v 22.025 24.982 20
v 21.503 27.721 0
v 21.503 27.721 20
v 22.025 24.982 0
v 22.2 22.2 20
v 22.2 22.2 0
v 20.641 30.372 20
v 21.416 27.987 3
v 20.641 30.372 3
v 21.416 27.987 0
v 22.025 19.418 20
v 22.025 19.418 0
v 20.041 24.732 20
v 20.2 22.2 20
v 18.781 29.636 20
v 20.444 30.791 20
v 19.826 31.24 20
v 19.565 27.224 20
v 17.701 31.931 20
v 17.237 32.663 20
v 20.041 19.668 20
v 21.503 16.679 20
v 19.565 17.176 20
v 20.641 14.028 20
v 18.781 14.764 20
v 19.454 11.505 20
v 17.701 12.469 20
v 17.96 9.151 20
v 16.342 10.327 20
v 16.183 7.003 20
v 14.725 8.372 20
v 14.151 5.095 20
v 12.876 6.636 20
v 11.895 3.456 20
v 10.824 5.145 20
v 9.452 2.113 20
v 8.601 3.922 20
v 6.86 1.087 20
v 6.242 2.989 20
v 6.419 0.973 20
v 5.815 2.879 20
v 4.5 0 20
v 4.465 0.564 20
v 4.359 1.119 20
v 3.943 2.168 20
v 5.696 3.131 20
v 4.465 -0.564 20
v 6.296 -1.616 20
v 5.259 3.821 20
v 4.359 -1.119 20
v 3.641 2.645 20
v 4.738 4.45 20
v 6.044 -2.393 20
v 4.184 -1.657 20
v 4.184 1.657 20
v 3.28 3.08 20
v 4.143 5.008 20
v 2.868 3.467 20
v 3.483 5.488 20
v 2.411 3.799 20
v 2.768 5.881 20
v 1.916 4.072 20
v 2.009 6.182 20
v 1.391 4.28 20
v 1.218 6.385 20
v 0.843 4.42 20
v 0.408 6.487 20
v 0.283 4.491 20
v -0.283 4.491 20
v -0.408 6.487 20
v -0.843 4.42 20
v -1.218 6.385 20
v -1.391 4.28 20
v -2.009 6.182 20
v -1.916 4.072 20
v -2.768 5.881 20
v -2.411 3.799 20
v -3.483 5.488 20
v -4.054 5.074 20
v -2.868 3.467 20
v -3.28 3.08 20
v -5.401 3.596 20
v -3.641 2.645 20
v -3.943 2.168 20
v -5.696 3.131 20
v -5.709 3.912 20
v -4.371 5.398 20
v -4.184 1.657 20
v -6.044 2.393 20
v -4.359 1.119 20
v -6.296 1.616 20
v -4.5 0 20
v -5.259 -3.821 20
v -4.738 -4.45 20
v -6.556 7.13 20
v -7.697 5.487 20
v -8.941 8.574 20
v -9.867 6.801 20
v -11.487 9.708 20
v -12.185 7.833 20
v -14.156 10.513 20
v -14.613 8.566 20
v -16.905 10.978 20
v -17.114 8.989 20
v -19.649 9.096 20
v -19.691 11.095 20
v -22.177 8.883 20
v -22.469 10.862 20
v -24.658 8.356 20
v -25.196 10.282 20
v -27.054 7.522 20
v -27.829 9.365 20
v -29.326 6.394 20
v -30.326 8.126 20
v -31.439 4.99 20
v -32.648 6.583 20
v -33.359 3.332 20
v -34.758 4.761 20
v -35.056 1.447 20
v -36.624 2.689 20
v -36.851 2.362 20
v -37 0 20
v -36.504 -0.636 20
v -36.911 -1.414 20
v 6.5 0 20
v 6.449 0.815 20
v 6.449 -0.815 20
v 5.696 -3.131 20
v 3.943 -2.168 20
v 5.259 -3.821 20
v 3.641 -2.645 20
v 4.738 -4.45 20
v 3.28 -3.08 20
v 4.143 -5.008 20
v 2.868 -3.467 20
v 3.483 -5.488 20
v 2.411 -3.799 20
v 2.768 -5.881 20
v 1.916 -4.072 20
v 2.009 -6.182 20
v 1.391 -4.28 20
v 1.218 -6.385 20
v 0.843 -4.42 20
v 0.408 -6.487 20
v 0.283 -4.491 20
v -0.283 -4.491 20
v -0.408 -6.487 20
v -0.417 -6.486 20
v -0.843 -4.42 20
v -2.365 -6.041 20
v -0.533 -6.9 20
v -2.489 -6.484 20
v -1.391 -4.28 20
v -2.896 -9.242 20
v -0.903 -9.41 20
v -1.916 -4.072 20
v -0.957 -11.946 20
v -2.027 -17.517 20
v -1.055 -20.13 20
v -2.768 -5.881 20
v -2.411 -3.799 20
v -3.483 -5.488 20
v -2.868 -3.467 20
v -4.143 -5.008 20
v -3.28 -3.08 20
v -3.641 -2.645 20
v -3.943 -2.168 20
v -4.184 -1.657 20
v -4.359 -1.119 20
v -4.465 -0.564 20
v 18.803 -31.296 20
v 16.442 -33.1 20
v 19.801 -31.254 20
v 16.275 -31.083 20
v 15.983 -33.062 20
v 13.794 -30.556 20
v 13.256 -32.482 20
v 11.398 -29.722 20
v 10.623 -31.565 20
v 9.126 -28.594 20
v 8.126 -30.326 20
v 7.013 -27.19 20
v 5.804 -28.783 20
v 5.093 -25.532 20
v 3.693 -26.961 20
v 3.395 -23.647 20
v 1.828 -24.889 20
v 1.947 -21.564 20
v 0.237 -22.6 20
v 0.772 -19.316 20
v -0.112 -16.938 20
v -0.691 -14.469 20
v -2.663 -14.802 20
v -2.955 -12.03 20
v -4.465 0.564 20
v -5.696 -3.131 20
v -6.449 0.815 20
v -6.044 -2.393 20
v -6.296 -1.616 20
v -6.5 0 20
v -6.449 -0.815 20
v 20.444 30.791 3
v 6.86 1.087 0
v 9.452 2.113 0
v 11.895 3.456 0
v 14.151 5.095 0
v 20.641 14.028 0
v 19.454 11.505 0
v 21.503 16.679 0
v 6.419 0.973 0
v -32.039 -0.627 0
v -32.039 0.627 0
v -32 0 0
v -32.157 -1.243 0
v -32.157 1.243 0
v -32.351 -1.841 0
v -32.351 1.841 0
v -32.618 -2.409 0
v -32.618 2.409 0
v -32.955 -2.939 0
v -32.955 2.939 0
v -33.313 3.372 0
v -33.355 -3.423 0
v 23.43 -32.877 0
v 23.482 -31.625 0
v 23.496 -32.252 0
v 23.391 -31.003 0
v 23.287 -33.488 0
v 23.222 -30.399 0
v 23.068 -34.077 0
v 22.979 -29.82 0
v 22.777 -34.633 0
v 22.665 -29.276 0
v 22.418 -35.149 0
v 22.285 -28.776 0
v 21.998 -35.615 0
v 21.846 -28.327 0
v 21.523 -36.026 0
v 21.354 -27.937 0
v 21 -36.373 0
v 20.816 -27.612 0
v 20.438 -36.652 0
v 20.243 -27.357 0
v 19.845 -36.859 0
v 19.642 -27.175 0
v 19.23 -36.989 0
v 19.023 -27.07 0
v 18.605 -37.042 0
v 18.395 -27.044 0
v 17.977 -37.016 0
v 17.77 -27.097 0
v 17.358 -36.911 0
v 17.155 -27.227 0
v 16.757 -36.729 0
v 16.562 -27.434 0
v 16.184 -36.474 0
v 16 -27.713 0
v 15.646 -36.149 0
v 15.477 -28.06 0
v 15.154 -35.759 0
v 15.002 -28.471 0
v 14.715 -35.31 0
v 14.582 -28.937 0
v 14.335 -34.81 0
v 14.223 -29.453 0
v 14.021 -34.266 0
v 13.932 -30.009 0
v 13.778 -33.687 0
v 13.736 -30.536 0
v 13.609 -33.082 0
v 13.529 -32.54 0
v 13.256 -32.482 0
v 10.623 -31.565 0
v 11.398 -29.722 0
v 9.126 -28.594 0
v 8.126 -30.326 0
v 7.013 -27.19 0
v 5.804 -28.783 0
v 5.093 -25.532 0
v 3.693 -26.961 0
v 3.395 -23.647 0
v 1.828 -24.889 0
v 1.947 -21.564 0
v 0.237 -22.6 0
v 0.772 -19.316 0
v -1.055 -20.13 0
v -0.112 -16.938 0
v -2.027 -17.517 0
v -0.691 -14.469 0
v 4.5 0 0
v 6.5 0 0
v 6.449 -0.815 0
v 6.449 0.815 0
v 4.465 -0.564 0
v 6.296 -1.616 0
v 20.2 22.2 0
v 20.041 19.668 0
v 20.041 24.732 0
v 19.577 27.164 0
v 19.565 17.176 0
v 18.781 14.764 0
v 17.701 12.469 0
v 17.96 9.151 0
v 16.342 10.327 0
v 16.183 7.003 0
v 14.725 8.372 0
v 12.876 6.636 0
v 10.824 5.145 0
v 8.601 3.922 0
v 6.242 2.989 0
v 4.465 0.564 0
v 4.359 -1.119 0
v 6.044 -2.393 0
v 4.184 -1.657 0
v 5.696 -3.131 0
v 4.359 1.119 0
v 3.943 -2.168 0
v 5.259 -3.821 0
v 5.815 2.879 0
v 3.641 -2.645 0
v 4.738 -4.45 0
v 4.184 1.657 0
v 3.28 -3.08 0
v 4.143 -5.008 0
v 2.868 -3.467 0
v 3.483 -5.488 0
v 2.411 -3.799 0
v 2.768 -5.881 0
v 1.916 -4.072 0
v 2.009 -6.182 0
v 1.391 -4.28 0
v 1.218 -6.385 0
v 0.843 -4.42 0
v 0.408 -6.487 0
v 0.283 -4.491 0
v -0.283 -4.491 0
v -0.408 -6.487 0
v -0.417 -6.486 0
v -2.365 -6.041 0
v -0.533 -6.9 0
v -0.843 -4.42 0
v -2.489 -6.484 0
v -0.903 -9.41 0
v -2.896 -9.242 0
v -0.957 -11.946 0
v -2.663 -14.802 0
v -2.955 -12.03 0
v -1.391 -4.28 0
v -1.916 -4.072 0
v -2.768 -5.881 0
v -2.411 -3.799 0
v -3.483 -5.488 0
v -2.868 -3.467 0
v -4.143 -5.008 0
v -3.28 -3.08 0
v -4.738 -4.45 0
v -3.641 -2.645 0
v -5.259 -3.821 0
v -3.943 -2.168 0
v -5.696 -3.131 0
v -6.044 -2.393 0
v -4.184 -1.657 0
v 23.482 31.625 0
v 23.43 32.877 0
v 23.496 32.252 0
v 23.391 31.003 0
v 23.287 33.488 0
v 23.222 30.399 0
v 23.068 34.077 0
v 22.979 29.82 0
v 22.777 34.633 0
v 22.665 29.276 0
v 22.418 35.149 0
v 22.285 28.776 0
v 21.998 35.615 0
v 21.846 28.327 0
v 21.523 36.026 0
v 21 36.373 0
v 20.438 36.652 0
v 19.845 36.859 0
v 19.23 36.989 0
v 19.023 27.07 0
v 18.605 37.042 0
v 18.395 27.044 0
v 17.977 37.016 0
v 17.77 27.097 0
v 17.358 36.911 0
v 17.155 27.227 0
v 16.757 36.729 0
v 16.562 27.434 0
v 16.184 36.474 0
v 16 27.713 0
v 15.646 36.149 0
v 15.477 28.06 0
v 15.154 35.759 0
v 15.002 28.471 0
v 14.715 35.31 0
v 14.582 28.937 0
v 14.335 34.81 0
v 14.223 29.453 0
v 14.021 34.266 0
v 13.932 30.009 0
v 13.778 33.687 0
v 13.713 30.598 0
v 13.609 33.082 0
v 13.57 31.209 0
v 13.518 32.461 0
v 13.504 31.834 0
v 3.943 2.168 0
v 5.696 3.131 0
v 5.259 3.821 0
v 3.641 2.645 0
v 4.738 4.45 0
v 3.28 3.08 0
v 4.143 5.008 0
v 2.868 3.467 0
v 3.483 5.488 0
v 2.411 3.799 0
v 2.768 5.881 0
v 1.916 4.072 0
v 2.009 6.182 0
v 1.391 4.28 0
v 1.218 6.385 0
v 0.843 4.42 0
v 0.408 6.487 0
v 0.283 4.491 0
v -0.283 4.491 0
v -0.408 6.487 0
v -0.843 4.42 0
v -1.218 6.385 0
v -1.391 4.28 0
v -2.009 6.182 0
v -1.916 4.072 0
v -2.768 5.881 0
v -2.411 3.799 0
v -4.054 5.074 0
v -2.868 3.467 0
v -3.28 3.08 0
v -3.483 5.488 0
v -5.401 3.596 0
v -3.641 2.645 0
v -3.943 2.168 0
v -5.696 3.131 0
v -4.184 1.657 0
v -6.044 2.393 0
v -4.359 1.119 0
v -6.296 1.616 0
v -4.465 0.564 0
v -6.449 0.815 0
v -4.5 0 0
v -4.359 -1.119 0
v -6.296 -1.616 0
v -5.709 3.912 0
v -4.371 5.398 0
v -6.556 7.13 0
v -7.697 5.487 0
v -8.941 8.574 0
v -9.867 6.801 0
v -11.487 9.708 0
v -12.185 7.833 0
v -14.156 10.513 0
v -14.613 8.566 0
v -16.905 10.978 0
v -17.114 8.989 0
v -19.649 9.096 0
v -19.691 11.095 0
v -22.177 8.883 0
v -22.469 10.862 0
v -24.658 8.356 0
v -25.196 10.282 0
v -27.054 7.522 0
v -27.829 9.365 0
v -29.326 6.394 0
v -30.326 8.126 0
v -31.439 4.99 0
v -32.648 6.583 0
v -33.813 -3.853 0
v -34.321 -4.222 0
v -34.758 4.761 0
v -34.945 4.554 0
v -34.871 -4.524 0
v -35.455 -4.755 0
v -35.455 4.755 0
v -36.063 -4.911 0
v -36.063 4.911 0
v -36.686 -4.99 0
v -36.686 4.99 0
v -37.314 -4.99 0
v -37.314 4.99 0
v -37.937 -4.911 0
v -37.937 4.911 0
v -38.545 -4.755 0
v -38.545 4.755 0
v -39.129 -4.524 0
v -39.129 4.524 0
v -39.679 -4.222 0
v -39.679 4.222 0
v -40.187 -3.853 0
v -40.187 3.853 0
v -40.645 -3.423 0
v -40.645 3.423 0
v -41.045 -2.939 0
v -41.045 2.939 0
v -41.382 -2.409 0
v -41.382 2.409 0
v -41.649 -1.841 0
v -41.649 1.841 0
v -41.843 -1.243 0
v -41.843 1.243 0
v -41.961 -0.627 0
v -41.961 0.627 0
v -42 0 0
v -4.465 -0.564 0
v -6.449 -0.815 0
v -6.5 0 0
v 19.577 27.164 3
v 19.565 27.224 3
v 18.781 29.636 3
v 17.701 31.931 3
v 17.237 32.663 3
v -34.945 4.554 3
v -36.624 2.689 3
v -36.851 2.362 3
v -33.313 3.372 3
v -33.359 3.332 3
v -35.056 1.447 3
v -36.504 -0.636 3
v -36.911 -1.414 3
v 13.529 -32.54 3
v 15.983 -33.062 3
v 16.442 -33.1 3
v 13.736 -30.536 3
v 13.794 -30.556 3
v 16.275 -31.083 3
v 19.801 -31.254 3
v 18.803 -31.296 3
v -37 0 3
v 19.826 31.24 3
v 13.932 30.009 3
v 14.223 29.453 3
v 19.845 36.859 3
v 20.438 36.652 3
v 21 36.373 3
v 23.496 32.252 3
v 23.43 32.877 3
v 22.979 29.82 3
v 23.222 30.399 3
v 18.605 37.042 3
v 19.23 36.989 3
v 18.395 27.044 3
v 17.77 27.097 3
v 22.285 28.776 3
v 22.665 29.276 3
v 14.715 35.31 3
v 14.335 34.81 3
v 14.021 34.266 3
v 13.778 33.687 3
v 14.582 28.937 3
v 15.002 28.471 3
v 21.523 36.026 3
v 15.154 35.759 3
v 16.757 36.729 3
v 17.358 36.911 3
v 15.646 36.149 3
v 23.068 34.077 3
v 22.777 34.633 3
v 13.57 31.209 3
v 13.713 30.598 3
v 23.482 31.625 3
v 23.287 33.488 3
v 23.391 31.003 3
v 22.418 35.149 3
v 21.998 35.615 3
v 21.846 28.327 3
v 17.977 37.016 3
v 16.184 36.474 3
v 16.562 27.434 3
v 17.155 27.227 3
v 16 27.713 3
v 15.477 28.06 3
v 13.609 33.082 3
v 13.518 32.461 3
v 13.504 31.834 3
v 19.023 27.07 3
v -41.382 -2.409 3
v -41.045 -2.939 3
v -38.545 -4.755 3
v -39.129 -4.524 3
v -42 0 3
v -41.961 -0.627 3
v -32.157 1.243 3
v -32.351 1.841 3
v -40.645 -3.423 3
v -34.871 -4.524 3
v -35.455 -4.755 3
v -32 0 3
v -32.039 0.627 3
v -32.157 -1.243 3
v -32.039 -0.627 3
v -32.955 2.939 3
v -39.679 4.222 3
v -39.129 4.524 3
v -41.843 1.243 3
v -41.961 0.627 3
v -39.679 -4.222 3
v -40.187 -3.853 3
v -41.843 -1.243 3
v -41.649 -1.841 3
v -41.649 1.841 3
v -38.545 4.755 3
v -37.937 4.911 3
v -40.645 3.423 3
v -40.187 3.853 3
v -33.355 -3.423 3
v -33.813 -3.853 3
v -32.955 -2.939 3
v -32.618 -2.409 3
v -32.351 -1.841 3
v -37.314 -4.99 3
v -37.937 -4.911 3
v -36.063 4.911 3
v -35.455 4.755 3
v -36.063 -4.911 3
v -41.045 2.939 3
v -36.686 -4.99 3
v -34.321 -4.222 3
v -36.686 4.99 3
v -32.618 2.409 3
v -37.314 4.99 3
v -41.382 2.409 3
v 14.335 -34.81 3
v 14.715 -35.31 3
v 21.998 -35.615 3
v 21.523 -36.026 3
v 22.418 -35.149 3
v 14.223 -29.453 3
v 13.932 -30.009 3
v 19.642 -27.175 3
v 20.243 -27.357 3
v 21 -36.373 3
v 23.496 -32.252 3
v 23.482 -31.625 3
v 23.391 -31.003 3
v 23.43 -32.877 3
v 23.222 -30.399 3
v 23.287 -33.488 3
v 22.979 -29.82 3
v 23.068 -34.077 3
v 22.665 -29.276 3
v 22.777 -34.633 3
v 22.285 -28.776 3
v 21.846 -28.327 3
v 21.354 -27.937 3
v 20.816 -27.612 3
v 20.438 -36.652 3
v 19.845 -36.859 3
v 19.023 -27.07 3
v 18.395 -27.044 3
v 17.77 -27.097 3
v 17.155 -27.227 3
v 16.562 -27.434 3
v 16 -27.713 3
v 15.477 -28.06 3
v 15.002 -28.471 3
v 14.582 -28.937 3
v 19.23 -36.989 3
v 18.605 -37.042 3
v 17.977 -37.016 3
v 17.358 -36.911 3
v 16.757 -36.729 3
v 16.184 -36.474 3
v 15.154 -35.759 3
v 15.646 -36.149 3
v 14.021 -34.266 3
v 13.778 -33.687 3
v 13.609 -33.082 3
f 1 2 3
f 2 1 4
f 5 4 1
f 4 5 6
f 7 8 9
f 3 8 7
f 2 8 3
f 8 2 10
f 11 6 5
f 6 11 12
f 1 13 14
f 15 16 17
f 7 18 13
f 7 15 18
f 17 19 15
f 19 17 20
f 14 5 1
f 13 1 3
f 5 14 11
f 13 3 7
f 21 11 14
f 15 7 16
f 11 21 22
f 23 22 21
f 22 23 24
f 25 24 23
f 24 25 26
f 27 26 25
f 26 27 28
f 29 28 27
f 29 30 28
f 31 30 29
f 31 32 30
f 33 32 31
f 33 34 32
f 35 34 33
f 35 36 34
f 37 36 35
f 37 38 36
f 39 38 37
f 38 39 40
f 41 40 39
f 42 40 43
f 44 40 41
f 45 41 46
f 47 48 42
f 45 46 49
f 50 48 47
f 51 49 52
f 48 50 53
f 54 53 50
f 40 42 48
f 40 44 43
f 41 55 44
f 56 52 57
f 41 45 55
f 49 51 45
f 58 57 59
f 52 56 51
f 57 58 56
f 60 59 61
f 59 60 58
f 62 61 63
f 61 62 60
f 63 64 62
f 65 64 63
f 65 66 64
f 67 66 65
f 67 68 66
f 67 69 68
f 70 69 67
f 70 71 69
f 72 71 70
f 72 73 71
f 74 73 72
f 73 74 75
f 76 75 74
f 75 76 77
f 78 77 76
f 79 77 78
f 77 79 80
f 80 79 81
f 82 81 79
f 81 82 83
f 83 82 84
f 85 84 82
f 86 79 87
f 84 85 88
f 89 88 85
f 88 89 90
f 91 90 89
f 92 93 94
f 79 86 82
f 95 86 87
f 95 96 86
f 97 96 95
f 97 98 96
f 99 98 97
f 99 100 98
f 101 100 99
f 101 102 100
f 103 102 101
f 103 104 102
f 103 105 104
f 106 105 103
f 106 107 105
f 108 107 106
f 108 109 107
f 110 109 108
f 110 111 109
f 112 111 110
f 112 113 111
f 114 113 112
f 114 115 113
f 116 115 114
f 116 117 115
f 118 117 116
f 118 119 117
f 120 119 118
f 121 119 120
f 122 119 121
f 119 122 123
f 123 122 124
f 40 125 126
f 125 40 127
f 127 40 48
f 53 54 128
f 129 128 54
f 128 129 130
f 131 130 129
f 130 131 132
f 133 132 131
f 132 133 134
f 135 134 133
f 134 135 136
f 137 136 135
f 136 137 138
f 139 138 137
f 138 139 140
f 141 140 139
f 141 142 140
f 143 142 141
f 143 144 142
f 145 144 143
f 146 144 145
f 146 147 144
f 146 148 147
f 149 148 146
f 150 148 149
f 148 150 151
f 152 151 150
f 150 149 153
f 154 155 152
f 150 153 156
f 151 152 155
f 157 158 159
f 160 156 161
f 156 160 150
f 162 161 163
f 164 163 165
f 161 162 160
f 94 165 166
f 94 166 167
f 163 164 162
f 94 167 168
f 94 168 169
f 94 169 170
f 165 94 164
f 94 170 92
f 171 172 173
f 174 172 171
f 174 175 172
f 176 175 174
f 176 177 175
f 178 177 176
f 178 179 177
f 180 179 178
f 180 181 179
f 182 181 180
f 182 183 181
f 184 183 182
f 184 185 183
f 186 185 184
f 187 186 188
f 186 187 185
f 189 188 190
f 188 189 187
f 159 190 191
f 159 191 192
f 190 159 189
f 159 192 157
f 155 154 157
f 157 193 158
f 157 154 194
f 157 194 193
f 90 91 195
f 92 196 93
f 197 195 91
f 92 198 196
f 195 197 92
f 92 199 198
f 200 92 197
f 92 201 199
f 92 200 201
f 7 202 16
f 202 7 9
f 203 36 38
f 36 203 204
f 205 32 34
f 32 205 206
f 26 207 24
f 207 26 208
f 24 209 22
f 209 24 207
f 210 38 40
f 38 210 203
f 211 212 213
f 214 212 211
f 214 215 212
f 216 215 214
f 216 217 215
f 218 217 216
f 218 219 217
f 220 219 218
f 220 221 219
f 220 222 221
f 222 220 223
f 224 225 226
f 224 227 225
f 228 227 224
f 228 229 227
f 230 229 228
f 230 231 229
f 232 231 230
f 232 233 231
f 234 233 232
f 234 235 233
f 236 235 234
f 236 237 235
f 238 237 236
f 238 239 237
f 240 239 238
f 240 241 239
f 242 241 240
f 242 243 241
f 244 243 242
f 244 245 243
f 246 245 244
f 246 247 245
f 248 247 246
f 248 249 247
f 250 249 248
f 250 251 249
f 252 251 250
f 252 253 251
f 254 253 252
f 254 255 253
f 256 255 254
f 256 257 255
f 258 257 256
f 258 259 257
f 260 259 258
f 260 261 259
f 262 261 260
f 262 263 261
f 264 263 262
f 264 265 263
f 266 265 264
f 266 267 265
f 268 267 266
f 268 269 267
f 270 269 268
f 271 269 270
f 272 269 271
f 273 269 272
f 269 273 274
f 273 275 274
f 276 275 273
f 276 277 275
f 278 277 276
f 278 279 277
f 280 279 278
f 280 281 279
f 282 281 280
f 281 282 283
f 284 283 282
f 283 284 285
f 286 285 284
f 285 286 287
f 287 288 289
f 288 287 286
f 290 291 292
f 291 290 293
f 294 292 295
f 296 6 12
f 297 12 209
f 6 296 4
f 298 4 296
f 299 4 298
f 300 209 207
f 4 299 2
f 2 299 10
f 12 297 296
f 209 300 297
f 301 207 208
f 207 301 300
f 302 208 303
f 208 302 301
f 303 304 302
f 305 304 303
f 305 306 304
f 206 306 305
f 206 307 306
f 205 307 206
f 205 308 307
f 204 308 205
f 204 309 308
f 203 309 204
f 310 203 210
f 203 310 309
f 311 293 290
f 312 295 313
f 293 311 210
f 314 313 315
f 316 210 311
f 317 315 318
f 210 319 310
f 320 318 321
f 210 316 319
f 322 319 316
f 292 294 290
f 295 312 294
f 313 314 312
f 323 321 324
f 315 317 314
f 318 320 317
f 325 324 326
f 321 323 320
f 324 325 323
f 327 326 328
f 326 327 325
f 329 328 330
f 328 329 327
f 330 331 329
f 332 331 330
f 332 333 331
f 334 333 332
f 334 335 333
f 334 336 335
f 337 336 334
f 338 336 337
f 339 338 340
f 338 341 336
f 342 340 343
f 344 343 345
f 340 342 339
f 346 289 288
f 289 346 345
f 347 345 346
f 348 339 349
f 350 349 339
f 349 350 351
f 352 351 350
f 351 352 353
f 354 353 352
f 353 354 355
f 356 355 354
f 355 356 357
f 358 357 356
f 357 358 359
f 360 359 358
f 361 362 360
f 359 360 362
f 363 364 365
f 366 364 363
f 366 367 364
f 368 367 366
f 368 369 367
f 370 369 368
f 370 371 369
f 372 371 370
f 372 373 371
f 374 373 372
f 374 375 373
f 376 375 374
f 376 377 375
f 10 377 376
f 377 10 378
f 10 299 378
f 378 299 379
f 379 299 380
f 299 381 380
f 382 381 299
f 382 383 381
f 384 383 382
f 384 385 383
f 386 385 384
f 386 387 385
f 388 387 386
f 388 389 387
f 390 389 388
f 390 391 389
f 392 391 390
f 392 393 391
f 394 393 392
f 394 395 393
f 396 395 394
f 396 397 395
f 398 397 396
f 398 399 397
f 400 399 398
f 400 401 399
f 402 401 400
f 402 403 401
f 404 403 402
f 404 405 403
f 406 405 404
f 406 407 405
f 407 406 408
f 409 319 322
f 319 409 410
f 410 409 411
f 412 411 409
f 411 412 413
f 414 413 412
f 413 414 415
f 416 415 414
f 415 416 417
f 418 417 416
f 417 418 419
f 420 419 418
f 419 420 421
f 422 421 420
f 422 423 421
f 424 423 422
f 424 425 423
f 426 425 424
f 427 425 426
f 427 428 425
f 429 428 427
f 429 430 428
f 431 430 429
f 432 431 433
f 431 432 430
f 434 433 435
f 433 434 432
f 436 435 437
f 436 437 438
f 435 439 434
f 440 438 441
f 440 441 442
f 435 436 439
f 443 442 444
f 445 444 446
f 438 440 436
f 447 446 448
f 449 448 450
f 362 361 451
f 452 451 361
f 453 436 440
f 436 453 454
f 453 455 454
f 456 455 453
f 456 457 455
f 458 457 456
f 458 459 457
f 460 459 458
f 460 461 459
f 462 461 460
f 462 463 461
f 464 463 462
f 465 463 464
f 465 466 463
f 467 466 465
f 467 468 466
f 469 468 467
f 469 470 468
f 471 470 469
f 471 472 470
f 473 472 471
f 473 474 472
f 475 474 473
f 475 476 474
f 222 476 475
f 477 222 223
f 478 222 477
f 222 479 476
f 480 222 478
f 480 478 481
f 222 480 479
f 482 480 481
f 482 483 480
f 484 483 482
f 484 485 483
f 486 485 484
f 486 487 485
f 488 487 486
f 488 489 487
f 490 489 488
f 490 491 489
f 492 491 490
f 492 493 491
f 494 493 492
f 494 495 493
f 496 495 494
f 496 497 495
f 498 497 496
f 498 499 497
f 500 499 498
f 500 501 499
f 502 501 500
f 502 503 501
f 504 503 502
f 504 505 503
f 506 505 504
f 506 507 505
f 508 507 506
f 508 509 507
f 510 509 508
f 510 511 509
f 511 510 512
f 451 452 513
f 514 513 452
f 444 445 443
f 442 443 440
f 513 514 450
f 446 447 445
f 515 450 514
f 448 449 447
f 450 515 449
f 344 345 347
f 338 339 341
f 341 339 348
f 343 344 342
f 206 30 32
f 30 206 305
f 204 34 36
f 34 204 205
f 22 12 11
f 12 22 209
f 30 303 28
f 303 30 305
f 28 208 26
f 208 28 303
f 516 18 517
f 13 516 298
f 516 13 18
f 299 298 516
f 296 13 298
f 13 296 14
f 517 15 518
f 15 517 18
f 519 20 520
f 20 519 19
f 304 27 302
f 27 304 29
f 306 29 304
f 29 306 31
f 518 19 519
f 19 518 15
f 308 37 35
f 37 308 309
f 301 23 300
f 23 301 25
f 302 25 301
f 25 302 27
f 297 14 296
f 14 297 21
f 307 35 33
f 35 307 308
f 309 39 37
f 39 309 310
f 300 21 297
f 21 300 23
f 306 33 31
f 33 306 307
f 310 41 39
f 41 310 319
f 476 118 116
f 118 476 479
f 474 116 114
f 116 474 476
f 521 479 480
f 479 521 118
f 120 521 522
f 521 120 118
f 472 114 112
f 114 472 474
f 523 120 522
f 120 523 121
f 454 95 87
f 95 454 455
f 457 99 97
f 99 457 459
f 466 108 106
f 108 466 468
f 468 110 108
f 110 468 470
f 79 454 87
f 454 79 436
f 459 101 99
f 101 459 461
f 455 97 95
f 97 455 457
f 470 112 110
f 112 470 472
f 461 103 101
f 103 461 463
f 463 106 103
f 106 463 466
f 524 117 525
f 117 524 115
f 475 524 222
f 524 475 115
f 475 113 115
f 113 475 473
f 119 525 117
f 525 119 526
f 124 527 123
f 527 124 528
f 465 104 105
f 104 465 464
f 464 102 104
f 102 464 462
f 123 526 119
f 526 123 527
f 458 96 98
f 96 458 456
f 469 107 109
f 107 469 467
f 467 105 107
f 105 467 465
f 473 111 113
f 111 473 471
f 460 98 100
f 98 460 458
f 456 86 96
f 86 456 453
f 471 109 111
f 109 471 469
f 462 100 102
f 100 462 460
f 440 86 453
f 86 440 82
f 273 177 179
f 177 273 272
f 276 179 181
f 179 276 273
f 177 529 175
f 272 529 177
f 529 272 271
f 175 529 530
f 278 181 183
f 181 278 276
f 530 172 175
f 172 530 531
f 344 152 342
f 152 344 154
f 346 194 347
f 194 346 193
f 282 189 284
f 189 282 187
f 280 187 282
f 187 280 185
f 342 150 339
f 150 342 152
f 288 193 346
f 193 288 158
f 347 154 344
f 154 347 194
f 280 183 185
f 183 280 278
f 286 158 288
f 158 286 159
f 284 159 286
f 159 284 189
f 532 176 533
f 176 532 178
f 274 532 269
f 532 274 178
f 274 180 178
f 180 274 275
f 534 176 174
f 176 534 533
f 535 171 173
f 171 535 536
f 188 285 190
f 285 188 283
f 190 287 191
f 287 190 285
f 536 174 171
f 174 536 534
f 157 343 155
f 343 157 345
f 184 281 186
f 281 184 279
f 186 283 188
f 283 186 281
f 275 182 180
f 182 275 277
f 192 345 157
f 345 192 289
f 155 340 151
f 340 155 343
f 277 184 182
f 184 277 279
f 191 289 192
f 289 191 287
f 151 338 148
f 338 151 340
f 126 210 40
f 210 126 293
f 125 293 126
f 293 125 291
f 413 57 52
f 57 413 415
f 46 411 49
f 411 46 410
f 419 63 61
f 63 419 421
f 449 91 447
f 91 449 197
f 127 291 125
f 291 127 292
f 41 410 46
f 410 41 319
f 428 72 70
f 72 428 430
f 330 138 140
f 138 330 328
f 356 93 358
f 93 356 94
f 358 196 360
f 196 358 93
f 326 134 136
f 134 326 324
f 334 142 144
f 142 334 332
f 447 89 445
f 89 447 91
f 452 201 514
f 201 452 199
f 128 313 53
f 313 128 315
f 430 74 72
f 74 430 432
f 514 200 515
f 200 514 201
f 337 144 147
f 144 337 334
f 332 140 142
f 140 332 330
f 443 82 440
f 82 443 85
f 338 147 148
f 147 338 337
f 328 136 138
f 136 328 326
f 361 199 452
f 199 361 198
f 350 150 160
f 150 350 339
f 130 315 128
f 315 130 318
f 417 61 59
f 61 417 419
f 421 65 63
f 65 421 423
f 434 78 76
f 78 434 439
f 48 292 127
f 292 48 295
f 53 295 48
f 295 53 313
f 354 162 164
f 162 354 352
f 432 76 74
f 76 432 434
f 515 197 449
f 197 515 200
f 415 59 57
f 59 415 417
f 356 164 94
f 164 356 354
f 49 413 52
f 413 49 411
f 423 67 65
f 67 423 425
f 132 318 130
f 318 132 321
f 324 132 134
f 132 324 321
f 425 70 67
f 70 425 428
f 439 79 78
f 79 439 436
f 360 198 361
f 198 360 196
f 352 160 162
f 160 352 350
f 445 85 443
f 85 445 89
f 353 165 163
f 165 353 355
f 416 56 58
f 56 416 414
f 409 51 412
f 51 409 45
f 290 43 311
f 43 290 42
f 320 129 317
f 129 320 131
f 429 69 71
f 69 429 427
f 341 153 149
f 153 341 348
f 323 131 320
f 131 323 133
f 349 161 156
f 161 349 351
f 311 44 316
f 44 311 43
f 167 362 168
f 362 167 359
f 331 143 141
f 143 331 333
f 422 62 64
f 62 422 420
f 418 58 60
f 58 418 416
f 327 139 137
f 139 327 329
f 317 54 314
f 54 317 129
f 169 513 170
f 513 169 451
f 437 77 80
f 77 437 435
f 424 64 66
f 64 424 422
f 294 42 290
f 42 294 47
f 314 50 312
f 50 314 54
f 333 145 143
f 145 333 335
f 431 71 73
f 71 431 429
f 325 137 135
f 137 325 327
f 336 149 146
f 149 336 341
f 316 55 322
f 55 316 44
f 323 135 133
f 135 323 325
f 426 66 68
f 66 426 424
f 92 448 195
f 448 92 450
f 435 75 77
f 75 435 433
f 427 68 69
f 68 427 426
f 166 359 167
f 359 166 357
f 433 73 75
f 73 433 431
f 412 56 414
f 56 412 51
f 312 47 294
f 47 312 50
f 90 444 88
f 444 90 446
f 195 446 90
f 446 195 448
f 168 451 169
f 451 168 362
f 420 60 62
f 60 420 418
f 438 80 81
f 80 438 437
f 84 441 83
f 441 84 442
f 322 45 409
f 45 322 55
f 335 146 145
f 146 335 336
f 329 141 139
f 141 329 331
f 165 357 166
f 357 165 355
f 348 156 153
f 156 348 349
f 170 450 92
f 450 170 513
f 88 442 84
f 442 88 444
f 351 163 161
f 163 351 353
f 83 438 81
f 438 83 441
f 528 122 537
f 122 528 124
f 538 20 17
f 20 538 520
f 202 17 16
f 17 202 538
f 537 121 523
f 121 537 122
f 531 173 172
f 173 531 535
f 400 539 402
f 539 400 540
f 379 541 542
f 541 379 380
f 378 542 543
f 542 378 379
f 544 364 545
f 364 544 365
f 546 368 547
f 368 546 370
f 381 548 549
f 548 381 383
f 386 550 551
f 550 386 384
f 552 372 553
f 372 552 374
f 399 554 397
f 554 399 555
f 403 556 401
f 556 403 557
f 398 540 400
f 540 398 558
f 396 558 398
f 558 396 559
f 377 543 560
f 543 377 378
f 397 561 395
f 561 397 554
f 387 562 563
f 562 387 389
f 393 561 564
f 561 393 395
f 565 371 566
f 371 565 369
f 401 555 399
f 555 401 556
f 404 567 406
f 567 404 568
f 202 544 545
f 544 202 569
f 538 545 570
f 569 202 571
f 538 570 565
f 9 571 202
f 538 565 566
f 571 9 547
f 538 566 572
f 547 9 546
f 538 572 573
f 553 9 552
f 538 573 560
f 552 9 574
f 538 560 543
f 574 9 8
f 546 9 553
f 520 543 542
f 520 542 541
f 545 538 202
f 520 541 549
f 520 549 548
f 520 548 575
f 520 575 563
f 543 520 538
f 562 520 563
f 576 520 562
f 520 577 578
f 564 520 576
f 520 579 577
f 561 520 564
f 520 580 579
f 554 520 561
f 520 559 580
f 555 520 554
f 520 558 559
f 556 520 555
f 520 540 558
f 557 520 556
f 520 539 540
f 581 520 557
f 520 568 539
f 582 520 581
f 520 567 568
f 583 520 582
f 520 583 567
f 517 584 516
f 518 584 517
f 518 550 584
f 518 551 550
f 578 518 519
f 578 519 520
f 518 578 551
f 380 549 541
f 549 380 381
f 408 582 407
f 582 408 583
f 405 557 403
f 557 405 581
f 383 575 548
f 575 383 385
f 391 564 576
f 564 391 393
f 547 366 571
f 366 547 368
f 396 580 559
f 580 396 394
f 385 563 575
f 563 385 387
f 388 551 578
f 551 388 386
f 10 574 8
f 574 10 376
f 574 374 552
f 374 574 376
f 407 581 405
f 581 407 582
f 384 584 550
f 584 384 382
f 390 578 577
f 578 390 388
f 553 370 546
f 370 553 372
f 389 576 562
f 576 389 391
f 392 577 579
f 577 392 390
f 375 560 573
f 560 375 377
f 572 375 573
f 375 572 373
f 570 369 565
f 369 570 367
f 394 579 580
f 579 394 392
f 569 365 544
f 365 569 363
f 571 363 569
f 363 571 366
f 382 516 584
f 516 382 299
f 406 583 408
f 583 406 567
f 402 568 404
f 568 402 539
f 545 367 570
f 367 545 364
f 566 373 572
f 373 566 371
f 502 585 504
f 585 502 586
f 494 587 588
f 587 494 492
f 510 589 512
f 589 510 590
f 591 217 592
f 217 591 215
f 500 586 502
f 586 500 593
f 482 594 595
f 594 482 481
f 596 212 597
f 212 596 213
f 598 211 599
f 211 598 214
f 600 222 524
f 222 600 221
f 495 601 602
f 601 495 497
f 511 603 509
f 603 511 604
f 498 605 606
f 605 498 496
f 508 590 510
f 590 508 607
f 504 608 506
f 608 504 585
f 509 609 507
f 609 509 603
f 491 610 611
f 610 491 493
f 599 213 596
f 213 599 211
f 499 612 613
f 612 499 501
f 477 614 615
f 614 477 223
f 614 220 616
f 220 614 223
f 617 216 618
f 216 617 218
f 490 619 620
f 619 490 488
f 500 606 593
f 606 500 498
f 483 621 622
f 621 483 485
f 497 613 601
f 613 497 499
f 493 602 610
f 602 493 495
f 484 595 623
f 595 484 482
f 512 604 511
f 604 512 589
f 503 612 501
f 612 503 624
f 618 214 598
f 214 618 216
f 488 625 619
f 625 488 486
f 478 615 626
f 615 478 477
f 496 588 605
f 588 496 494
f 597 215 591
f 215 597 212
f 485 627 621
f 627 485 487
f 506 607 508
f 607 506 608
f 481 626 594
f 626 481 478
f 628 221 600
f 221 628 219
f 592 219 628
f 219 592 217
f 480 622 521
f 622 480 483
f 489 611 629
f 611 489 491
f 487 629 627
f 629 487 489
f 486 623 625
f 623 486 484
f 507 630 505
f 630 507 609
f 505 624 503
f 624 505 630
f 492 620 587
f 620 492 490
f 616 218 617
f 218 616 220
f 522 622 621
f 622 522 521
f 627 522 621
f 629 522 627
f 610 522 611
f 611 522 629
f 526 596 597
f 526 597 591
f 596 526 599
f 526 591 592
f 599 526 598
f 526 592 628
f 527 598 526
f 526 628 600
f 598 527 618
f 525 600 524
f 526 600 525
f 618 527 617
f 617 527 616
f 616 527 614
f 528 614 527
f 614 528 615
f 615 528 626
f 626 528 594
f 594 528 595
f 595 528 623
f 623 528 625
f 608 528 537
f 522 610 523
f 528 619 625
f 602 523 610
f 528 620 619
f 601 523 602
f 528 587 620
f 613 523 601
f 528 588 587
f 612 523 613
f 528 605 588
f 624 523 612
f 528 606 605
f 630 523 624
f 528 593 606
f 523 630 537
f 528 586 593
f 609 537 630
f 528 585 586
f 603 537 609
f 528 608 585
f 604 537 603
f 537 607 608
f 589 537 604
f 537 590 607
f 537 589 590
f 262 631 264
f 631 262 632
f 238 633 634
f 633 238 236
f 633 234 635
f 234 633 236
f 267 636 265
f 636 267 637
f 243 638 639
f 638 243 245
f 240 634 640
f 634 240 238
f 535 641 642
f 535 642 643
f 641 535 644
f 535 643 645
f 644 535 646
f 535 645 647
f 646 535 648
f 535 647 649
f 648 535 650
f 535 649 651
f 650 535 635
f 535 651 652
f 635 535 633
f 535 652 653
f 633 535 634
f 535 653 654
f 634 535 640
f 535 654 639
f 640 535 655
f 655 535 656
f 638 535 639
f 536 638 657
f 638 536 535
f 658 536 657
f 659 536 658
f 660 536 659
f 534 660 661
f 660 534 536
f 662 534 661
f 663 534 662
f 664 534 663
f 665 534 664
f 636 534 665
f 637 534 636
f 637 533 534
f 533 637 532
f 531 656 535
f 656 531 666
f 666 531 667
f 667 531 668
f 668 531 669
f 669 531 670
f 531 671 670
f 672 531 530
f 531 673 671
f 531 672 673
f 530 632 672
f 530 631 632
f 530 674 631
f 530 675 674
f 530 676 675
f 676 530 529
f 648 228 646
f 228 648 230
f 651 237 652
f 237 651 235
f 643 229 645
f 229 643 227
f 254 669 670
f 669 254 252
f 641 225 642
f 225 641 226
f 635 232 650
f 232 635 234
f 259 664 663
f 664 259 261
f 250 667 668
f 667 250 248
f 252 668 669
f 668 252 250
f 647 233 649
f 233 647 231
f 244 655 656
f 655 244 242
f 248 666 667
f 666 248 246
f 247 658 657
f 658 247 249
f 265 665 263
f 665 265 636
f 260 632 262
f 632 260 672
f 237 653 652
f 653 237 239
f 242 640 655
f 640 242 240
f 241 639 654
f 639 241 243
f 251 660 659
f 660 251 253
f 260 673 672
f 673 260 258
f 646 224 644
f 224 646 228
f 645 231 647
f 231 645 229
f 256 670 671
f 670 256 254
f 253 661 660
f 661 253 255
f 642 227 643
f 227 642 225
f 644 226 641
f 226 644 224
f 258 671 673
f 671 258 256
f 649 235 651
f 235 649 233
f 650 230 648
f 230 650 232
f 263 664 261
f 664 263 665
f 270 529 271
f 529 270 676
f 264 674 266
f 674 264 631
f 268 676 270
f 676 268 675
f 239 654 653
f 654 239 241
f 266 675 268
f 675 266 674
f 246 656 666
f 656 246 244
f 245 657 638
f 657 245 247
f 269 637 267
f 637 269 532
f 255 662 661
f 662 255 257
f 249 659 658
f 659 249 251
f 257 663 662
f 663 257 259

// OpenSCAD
$fn = 50;

inner = 9;
outer = 74;
wall = 2;
deep = 20;

module luk() {
    wsp = 0.6;
    translate([0,outer*wsp/2])
    difference() {
        cylinder(deep, d=outer*wsp);
        translate([0,0,-0.1])
        cylinder(deep+0.2, d=outer*wsp-2*wall);
        translate([-2*outer, -outer, -0.1])
        cube([2*outer, 2*outer, deep+0.2]);
    }
}

module podstawa() {
    luk();
    rotate([0,0,120]) luk();
    rotate([0,0,240]) luk();
    cylinder(deep, d=inner+2*wall);
}

module blokada(kat) {
    rotate([0,0,kat])
    translate([outer/2,0,0])
    cylinder(3, d=10);
}

module srodek() {
    difference() {
        podstawa();
        translate([0,0,-0.1])
        cylinder(deep+0.2, d=inner);
    }    
}

intersection() {
    srodek();
    cylinder(deep, d=outer);    
}
blokada(60);
blokada(180);
blokada(300);
